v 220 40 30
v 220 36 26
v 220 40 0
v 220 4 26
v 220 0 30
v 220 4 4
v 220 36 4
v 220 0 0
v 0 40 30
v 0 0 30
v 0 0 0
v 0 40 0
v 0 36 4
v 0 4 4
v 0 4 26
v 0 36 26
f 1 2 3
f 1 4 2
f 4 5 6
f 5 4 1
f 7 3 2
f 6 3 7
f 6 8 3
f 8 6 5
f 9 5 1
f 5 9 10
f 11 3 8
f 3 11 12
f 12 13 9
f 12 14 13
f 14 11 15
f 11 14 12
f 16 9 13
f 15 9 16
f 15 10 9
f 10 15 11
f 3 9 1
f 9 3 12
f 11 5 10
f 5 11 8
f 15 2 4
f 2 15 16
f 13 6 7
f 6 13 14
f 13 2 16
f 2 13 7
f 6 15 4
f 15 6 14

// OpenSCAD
$fn = 32;

// ----------------------------------------------------------------------
// Box beam: 200-250 mm hollow beam
// ----------------------------------------------------------------------

// --- parameters (mm) ---
beam_l = 220;             // beam length, X
beam_w = 40;              // beam width, Y
beam_h = 30;              // beam height, Z
wall = 4;                 // wall thickness

difference() {
  cube([beam_l, beam_w, beam_h]);
  translate([-1, wall, wall])
    cube([beam_l + 2, beam_w - 2 * wall, beam_h - 2 * wall]);
}
